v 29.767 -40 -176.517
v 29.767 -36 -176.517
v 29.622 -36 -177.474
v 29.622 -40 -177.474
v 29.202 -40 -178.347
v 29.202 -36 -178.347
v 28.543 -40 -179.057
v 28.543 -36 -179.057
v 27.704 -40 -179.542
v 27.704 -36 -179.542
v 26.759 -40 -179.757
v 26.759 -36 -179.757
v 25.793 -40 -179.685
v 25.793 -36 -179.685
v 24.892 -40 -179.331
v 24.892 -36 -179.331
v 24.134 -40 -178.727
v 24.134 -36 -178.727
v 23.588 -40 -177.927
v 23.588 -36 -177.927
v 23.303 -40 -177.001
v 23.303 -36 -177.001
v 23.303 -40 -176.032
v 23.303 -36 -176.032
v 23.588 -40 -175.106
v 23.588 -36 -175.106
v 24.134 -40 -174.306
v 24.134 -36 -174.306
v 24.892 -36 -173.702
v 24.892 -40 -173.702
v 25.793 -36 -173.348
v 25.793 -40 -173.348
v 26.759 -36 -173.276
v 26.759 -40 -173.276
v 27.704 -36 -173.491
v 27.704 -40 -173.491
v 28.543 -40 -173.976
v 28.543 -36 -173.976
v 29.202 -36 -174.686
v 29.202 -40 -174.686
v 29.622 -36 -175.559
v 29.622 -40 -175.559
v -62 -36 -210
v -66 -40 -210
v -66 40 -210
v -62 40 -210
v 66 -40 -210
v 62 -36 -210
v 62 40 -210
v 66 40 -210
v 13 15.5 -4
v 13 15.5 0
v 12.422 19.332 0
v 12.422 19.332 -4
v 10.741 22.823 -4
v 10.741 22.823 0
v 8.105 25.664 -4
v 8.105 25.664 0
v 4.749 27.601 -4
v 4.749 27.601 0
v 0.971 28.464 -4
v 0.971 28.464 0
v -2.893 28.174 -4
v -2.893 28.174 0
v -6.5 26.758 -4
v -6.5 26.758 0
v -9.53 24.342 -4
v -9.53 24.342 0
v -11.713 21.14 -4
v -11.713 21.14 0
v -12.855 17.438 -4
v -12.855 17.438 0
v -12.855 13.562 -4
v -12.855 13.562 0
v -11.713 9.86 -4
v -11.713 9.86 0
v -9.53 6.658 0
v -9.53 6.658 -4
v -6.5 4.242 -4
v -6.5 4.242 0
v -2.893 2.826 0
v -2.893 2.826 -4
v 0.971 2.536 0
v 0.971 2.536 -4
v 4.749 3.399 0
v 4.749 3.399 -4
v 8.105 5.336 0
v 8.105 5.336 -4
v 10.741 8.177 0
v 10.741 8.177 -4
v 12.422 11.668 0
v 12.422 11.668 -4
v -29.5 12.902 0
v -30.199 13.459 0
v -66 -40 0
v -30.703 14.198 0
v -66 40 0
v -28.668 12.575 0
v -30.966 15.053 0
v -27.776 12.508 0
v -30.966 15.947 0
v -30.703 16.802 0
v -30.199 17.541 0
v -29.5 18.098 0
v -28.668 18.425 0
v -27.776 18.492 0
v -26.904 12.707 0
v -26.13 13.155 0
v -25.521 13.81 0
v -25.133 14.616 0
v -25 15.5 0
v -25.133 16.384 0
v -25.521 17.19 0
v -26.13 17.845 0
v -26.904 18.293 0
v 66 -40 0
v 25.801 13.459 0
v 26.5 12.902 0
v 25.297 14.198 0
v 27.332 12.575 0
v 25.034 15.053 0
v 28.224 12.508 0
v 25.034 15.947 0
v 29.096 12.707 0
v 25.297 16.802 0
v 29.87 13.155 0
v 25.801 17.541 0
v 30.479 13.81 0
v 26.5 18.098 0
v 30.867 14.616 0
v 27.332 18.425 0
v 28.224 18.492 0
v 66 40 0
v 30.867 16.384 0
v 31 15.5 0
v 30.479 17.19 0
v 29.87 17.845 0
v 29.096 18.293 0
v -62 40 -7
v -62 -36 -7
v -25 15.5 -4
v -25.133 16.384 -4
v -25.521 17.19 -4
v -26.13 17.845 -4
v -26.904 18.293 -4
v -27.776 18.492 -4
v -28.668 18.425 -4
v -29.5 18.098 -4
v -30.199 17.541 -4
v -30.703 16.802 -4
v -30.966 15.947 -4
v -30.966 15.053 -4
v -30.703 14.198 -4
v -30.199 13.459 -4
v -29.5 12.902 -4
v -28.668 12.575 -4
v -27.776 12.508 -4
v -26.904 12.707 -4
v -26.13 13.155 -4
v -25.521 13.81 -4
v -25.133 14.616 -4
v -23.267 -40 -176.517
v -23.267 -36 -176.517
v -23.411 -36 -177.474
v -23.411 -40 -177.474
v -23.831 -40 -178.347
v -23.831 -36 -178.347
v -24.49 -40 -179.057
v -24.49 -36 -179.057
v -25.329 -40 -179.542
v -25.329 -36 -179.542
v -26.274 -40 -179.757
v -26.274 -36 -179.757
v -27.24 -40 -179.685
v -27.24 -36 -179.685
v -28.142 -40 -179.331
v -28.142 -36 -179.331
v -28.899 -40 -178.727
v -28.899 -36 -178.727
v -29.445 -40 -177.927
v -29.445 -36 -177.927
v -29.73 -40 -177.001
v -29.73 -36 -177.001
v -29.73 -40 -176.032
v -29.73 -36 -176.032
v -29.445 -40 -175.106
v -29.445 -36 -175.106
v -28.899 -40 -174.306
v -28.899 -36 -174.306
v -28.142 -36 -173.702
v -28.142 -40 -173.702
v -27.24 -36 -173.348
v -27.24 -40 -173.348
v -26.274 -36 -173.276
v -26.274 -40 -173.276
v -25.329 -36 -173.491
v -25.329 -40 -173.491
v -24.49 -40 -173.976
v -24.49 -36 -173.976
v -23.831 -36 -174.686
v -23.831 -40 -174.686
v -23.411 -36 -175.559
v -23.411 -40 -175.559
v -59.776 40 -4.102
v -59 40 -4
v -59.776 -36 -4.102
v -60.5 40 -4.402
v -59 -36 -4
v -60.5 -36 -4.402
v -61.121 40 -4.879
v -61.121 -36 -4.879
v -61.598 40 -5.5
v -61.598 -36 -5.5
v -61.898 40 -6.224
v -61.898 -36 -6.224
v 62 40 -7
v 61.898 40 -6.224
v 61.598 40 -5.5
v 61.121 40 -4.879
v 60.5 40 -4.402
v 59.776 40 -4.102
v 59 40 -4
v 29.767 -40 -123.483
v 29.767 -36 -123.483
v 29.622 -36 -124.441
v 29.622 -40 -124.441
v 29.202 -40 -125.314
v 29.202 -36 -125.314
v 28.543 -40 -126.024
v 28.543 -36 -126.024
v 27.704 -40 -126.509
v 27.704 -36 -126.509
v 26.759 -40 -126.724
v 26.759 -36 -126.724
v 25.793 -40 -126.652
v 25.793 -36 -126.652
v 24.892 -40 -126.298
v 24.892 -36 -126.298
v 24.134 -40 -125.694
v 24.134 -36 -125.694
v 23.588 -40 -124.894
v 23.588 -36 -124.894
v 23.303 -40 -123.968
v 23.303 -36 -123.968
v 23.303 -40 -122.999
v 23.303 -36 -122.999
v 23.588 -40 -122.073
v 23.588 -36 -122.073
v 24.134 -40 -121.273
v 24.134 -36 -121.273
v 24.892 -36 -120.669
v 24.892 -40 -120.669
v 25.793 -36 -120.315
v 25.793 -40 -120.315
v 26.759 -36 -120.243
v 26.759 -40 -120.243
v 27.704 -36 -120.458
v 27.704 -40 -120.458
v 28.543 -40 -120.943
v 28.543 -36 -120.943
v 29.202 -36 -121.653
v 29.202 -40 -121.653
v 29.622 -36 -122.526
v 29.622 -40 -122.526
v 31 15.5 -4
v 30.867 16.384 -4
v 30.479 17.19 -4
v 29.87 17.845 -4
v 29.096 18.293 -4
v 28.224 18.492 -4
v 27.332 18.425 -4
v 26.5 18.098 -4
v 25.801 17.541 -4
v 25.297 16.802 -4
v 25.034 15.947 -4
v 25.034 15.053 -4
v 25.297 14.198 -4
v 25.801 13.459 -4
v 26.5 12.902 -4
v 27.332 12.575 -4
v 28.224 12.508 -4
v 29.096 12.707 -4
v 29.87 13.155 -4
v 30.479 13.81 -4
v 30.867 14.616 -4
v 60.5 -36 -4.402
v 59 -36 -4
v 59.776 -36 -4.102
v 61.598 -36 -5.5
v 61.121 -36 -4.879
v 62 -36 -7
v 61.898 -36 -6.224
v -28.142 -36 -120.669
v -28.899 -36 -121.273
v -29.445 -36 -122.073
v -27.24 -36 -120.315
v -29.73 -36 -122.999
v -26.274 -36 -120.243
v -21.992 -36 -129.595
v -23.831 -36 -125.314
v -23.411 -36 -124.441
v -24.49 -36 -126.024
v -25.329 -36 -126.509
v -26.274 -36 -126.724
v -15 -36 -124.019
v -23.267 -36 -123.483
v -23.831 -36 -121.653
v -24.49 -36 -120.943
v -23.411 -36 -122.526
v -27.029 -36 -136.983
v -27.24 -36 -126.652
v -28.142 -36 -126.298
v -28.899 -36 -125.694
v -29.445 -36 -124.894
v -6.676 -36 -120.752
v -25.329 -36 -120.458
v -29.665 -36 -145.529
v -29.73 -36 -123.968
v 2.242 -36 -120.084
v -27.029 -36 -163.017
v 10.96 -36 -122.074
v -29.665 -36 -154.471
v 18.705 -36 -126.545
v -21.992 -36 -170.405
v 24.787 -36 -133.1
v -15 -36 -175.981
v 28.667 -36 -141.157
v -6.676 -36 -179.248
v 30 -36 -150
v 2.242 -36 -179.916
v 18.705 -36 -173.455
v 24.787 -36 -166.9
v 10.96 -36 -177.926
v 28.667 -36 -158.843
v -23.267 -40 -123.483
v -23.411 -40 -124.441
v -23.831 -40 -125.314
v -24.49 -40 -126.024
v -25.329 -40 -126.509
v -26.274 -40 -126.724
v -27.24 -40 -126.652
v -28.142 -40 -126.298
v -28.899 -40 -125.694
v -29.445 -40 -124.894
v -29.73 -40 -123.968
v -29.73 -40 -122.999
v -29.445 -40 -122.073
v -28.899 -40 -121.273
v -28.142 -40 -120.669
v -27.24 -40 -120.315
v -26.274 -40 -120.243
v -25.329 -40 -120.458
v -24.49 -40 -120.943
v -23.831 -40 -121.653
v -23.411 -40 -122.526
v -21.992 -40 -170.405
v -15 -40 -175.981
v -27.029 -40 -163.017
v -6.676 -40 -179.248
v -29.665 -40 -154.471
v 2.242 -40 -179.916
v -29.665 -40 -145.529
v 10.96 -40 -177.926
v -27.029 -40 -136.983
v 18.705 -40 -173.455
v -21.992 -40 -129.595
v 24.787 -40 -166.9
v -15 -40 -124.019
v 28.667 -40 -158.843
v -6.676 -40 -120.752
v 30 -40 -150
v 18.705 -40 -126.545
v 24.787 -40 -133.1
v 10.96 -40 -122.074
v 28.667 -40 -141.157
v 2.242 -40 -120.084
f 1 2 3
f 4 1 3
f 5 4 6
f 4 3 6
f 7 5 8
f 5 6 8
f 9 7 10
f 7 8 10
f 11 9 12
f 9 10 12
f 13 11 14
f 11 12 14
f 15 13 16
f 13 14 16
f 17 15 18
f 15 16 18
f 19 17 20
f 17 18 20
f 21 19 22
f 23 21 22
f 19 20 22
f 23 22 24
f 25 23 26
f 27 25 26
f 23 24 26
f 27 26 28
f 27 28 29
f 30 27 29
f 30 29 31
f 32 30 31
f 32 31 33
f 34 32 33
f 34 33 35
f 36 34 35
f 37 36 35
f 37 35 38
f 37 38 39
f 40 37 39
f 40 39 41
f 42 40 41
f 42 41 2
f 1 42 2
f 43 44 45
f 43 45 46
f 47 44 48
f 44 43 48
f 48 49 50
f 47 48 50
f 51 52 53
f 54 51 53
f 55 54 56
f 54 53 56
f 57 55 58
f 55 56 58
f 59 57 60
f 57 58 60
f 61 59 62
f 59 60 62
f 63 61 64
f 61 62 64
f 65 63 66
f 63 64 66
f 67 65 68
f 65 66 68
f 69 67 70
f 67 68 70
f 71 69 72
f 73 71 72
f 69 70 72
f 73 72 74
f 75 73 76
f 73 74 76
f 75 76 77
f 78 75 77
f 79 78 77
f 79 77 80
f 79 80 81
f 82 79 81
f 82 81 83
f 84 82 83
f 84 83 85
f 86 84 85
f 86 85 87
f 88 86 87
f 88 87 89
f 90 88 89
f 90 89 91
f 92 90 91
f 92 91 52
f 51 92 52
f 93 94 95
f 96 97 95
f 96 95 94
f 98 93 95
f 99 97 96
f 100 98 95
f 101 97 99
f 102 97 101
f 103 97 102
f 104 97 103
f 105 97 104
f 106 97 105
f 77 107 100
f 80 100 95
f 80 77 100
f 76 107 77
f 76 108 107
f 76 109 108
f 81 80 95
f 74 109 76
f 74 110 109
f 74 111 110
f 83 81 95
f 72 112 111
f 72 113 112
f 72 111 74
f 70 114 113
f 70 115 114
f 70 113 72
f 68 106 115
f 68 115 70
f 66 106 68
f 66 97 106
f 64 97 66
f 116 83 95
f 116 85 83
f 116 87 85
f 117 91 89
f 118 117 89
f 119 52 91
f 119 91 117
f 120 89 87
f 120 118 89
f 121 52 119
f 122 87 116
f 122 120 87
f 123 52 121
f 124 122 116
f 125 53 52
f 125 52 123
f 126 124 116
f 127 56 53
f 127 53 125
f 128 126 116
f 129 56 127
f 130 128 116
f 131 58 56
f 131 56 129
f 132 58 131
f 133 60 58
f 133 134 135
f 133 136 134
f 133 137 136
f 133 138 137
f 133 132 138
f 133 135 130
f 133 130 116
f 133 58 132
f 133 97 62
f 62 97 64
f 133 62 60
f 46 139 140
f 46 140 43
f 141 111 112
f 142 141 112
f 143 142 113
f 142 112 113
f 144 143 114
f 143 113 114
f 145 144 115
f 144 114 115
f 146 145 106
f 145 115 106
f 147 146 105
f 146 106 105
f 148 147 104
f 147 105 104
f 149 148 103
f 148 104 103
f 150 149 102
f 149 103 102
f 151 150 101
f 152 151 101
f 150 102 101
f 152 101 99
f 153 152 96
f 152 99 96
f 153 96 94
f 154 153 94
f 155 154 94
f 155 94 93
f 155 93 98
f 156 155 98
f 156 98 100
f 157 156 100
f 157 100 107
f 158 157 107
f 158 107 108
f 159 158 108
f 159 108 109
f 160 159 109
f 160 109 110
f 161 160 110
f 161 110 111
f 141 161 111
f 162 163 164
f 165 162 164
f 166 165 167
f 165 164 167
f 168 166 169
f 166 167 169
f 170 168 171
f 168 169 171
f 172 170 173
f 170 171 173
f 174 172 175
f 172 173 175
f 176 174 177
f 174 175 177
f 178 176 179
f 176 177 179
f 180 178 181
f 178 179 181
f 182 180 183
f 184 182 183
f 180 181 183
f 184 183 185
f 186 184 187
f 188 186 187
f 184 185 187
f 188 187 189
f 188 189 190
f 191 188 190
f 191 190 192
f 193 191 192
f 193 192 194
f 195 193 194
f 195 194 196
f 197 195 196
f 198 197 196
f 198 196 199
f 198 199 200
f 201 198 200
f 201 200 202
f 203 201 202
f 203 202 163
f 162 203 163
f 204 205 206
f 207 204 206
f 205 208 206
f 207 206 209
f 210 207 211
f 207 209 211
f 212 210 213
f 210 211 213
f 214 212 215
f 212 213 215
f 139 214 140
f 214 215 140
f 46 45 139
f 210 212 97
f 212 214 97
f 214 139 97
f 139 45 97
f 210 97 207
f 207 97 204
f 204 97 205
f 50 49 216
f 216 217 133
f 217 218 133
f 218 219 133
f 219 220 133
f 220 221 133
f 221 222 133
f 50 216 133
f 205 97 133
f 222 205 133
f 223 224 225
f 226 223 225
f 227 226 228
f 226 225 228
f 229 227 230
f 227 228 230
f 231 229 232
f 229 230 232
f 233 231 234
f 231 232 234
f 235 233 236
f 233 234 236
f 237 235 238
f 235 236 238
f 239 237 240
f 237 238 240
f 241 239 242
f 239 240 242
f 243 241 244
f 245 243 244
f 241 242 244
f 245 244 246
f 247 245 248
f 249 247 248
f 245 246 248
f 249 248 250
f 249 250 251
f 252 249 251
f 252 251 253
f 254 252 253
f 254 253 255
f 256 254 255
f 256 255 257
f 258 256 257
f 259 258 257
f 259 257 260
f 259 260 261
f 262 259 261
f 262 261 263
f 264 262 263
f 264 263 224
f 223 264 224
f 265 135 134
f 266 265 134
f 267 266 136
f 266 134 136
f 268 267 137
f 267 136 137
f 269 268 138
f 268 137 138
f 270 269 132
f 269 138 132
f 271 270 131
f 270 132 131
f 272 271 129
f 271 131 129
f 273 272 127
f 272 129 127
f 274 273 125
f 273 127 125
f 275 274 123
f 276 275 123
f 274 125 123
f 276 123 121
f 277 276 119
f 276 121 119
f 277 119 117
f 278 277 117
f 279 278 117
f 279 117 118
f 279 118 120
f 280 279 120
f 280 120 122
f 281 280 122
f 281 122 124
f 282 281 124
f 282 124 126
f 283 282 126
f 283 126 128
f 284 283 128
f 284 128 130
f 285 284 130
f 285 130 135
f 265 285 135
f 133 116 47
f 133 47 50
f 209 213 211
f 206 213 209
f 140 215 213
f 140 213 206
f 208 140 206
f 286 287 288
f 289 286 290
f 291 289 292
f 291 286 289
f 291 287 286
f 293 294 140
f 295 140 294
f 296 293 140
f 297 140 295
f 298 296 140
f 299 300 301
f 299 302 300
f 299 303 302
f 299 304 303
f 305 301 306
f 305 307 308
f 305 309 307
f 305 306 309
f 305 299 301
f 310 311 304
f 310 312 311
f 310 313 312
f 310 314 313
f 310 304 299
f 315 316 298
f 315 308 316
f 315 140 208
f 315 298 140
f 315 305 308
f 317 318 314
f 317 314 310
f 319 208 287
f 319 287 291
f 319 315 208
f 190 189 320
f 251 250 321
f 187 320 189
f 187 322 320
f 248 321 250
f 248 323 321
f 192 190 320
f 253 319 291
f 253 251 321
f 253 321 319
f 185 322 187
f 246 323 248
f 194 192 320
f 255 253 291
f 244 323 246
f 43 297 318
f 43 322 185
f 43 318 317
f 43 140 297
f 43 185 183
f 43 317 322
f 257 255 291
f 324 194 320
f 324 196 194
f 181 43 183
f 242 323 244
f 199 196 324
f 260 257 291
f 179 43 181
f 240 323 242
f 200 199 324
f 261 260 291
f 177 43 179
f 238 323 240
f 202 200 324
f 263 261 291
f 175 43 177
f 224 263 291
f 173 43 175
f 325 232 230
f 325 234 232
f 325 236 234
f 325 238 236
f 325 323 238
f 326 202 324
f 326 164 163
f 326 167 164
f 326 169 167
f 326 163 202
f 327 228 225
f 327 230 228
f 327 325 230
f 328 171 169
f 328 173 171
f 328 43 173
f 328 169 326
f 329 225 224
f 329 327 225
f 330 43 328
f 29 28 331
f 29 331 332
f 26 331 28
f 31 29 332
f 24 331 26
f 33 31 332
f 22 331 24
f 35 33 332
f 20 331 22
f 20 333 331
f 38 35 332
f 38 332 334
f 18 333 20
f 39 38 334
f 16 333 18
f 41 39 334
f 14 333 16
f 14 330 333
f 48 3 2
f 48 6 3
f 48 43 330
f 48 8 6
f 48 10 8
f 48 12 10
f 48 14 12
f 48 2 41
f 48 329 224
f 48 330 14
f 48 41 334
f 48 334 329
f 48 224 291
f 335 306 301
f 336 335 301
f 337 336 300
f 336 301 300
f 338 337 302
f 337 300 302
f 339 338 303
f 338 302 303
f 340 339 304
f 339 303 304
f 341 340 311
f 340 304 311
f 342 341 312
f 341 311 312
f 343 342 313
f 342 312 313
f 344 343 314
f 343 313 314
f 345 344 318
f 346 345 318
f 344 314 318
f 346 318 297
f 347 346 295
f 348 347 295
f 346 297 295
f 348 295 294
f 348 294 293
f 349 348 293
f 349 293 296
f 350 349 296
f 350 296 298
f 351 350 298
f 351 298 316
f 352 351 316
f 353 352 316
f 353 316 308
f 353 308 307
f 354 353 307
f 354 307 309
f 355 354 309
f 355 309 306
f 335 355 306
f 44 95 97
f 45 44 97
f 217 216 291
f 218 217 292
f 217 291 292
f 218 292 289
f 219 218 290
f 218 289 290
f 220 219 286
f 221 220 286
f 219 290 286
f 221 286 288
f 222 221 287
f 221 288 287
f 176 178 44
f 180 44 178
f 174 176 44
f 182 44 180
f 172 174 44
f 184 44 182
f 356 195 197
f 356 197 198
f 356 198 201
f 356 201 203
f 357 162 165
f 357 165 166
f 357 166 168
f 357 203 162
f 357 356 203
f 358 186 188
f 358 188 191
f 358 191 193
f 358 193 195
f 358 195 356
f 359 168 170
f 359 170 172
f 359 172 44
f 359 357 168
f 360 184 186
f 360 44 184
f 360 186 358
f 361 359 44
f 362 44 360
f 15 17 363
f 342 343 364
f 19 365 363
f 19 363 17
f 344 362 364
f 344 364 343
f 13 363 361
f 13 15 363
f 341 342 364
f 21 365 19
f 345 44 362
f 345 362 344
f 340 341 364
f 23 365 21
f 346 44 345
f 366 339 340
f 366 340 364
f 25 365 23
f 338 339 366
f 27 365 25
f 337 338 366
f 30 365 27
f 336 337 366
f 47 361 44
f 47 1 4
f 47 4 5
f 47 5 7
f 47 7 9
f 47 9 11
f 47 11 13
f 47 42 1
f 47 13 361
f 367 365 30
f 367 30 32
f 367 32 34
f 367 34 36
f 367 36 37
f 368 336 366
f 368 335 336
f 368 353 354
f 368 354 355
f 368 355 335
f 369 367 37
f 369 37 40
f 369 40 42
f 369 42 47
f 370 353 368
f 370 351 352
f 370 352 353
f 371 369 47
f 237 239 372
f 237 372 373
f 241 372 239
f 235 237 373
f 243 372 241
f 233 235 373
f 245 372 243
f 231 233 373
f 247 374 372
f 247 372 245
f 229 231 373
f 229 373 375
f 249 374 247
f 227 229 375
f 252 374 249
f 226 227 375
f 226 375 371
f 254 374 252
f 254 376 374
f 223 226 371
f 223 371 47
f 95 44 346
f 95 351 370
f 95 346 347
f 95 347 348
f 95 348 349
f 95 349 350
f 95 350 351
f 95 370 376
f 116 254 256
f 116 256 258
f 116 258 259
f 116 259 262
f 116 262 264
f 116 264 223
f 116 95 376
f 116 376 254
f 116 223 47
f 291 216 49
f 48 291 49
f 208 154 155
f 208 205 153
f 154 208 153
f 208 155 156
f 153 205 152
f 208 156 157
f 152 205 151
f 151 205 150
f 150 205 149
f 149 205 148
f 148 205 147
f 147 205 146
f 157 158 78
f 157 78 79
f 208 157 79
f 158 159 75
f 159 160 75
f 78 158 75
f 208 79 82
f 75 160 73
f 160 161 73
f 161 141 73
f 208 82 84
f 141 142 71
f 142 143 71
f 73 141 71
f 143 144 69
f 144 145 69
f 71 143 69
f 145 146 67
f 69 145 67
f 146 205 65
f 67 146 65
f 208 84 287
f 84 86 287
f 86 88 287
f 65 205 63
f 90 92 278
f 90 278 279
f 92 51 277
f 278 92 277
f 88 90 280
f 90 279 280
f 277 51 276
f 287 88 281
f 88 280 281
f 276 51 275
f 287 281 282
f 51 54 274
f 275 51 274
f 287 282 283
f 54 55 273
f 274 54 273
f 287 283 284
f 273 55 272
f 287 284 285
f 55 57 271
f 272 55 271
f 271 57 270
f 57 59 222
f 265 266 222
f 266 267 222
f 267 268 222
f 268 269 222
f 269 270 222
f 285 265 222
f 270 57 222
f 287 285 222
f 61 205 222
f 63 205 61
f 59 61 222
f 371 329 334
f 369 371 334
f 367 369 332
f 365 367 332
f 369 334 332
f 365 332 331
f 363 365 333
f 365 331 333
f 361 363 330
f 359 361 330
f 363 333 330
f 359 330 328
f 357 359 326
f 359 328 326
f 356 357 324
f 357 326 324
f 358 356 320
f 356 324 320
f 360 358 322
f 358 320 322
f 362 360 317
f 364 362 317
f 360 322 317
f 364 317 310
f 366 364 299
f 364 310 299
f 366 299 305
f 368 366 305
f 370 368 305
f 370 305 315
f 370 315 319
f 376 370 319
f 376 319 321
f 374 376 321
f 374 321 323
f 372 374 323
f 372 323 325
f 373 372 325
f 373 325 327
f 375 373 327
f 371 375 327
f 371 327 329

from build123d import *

# Parameters (mm, degrees)
SKETCH_1_W          = 132
SKETCH_1_H          = 80
EXTRUDE_1_DEPTH     = 210
SKETCH_2_W          = 124
SKETCH_2_H          = 206
CUT_EXTRUDE_1_DEPTH = 76
SKETCH_3_R          = 13
SKETCH_3_R_2        = 3
CUT_EXTRUDE_2_DEPTH = 10
SKETCH_4_R          = 3.25
SKETCH_4_R_2        = 30
CUT_EXTRUDE_3_DEPTH = 10
FILLET_1_R          = 3


with BuildPart() as part:
    # 草图1 → 凸台-拉伸1 (new body)
    with BuildSketch(Plane.XY):
        Rectangle(SKETCH_1_W, SKETCH_1_H)
    extrude(amount=-EXTRUDE_1_DEPTH)

    # 草图2 → 切除-拉伸1 (cut)
    with BuildSketch(Plane(origin=(0, 40, 0), x_dir=(1, 0, 0), z_dir=(0, 1, 0))):
        with Locations((0, 107)):
            Rectangle(SKETCH_2_W, SKETCH_2_H)
    extrude(amount=-CUT_EXTRUDE_1_DEPTH, mode=Mode.SUBTRACT)

    # 草图3 → 切除-拉伸2 (cut)
    with BuildSketch(Plane.XY):
        with Locations((0, 15.5)):
            Circle(SKETCH_3_R)
        with Locations((-28, 15.5)):
            Circle(SKETCH_3_R_2)
        with Locations((28, 15.5)):
            Circle(SKETCH_3_R_2)
    extrude(amount=-CUT_EXTRUDE_2_DEPTH, mode=Mode.SUBTRACT)

    # 草图4 → 切除-拉伸3 (cut)
    with BuildSketch(Plane(origin=(0, -36, 0), x_dir=(1, 0, 0), z_dir=(0, 1, 0))):
        with Locations((26.516504294, 176.516504294)):
            Circle(SKETCH_4_R)
        with Locations((26.516504294, 123.483495706)):
            Circle(SKETCH_4_R)
        with Locations((-26.516504294, 123.483495706)):
            Circle(SKETCH_4_R)
        with Locations((-26.516504294, 176.516504294)):
            Circle(SKETCH_4_R)
        with Locations((0, 150)):
            Circle(SKETCH_4_R_2)
    extrude(amount=-CUT_EXTRUDE_3_DEPTH, mode=Mode.SUBTRACT)

    # 圆角1
    fillet_1_edges = [part.edges().sort_by_distance(p)[0] for p in [
        (-62, 2, -4),
        (62, 2, -4),
    ]]
    fillet(fillet_1_edges, radius=FILLET_1_R)


solid = part.part
